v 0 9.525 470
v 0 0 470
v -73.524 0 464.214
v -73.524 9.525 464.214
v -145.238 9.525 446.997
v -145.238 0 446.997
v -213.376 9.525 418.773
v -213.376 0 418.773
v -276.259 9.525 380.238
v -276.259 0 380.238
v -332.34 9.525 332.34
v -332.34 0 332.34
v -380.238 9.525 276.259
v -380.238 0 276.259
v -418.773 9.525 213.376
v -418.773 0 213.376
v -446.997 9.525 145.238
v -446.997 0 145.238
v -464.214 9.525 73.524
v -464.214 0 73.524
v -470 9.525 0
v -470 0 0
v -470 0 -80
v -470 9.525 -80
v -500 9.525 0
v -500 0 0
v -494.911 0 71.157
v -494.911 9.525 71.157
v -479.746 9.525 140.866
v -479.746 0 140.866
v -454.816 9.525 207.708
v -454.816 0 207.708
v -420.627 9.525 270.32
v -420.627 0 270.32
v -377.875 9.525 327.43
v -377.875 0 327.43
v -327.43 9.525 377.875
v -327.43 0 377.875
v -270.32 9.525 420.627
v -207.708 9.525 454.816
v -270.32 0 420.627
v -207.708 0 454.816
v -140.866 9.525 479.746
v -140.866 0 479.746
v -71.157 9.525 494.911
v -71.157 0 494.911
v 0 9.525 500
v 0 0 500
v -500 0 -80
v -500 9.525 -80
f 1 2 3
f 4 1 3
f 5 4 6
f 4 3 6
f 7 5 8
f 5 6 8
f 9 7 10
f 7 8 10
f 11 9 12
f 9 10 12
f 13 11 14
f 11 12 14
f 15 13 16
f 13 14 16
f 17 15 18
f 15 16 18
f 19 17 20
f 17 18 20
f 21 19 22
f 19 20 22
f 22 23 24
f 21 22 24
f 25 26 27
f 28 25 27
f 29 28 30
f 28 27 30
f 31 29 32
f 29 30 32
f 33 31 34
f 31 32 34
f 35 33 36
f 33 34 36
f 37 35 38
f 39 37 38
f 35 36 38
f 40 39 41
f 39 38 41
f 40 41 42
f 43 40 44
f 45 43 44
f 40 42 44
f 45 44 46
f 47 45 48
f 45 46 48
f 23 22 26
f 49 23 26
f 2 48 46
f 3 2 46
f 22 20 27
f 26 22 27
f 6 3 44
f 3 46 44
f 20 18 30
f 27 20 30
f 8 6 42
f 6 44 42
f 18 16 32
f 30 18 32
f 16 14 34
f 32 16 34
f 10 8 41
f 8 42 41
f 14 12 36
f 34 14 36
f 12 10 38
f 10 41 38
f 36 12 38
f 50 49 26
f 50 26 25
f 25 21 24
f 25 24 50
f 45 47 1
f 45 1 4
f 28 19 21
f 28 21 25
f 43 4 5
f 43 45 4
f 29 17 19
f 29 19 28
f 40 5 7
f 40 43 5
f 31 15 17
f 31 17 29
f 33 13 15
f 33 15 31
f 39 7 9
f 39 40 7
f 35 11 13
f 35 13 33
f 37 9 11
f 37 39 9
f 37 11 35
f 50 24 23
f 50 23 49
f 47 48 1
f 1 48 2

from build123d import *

# Parameters (mm, degrees)
BOSS_EXTRUDE1_DEPTH = 9.525
SKETCH3_W           = 30
SKETCH3_H           = 9.525
BOSS_EXTRUDE2_DEPTH = 80


with BuildPart() as part:
    # Sketch2 → Boss-Extrude1 (new body)
    with BuildSketch(Plane(origin=(0, 0, 0), x_dir=(1, 0, 0), z_dir=(0, 1, 0))):
        with BuildLine():
            ThreePointArc((0, -470), (-332.340187158, -332.340187158), (-470, 0))
            Line((-470, 0), (-500, 0))
            ThreePointArc((-500, 0), (-353.553390593, -353.553390593), (0, -500))
            Line((0, -500), (0, -470))
        make_face()
    extrude(amount=BOSS_EXTRUDE1_DEPTH)

    # Sketch3 → Boss-Extrude2 (add)
    with BuildSketch(Plane(origin=(0, 0, 0), x_dir=(-1, 0, 0), z_dir=(0, 0, -1))):
        with Locations((485, 4.7625)):
            Rectangle(SKETCH3_W, SKETCH3_H)
    extrude(amount=BOSS_EXTRUDE2_DEPTH)


solid = part.part
